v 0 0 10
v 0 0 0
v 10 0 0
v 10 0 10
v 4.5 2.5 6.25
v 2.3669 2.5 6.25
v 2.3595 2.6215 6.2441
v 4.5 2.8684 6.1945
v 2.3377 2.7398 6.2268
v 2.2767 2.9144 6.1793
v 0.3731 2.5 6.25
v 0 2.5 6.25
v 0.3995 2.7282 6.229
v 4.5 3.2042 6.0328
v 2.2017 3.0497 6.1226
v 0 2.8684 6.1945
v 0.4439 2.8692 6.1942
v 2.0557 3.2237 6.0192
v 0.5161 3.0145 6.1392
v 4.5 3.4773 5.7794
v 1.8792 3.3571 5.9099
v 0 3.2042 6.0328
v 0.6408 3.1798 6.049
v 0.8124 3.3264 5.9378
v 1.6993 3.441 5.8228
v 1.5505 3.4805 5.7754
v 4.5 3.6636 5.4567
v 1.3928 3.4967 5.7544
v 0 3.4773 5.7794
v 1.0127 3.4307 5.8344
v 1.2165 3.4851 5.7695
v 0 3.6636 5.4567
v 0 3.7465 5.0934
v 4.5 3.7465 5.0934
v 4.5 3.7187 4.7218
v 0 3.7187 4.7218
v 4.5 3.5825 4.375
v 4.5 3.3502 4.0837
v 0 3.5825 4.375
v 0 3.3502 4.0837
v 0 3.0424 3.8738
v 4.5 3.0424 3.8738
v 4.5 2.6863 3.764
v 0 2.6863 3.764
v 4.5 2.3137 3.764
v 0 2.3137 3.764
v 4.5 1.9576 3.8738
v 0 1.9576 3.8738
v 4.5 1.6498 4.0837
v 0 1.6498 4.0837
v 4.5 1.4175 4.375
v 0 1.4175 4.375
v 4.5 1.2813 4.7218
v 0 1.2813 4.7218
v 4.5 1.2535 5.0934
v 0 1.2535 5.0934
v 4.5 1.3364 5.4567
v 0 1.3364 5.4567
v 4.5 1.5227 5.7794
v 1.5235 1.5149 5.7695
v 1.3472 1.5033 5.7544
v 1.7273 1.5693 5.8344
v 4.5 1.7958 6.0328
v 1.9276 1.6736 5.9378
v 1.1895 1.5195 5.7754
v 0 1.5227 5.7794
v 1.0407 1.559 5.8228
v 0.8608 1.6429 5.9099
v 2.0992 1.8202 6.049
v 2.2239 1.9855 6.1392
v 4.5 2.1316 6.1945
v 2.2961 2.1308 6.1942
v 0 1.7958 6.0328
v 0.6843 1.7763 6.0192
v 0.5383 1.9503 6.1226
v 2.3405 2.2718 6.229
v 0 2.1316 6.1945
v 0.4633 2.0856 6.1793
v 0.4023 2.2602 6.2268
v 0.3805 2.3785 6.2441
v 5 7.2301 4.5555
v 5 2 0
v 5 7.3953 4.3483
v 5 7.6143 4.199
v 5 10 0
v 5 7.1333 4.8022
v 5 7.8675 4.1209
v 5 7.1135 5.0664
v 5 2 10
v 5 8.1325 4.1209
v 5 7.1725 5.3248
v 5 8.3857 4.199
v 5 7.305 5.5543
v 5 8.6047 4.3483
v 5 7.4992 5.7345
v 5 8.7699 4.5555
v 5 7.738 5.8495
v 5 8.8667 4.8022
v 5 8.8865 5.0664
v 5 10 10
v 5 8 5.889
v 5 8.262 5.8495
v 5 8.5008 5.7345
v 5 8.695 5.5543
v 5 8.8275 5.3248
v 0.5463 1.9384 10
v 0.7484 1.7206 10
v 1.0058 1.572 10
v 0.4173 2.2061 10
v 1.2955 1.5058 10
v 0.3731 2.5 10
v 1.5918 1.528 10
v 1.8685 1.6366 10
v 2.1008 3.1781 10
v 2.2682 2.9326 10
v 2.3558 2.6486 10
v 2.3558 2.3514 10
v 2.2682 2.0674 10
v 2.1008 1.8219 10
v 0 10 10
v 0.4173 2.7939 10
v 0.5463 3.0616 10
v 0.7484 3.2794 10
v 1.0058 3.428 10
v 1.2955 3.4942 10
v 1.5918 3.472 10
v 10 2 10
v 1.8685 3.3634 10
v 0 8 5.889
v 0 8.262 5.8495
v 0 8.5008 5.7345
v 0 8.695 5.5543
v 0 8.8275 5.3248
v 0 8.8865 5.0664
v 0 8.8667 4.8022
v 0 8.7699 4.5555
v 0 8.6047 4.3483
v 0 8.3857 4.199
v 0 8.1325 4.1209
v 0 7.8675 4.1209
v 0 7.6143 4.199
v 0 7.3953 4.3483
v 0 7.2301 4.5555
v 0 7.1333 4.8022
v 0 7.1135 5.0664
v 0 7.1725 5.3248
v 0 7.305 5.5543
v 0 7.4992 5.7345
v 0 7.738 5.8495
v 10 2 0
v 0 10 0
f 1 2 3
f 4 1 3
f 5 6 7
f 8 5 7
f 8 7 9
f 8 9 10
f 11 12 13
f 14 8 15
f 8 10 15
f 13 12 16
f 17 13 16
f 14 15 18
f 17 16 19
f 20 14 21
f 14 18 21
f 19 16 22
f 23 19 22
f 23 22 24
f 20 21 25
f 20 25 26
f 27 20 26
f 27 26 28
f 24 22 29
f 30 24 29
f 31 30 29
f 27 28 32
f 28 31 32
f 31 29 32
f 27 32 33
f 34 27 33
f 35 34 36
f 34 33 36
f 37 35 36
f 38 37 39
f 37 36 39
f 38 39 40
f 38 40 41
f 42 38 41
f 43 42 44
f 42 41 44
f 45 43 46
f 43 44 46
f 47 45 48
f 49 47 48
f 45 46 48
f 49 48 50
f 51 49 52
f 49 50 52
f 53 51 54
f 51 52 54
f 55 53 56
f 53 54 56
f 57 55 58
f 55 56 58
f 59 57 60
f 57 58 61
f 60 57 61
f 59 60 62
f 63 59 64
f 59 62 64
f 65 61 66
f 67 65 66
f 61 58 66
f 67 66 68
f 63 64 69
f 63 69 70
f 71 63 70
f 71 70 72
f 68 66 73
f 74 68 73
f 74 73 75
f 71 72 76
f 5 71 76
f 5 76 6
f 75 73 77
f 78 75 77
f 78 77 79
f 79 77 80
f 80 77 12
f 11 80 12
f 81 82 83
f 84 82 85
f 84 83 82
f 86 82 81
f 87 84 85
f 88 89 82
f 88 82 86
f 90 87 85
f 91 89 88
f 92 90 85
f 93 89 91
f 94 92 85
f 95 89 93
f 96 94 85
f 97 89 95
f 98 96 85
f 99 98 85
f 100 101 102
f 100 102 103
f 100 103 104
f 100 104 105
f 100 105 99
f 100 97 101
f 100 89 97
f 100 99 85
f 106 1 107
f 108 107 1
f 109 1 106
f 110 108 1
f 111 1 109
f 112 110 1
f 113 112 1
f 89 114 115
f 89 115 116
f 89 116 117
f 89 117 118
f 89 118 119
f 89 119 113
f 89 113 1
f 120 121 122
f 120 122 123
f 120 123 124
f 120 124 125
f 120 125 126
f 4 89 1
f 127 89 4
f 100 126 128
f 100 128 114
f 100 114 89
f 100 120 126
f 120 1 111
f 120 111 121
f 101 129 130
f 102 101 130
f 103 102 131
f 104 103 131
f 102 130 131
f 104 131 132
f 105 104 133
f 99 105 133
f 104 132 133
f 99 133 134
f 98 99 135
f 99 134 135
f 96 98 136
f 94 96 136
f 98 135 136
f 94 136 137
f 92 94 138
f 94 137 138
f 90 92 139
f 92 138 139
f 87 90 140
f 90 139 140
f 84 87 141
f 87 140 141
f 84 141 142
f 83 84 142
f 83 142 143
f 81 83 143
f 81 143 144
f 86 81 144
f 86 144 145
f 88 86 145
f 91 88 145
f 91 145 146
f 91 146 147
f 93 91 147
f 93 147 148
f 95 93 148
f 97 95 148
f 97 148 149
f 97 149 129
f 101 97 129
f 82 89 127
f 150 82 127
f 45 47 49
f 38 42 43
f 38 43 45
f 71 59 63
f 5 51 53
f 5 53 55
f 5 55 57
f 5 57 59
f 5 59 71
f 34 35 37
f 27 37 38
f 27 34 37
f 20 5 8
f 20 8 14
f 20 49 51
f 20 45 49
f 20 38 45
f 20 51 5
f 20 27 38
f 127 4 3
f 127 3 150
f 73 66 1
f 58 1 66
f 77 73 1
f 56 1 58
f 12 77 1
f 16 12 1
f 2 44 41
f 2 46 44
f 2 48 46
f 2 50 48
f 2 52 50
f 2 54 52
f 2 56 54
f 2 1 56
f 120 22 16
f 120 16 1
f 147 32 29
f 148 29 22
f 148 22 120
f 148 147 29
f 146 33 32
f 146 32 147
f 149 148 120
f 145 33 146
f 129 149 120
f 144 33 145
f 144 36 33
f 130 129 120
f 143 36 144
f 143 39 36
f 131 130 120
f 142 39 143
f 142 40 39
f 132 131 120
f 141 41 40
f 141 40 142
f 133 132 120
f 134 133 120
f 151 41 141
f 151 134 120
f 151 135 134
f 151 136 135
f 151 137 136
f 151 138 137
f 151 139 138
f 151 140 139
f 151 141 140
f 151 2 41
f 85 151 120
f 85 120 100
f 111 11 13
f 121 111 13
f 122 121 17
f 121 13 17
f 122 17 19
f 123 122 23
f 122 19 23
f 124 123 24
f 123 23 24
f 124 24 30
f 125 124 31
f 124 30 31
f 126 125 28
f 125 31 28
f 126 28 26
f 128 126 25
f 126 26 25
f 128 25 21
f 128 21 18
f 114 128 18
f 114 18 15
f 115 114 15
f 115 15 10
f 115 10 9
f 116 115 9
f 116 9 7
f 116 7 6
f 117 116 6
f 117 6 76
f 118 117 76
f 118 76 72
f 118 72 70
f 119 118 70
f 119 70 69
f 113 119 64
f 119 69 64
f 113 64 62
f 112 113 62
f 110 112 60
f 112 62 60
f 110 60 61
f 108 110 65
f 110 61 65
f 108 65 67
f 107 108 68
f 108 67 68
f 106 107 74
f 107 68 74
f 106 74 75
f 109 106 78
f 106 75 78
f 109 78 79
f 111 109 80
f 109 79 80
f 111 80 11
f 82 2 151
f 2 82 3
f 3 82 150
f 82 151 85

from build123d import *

# Parameters (mm, degrees)
SKETCH1_W                 = 10
SKETCH1_H                 = 10
EXTRUDE1_DEPTH            = 10
SKETCH2_W                 = 5
SKETCH2_H                 = 8
EXTRUDE2_DEPTH            = 11
SKETCH4_R                 = 1.25
CUT_EXTRUDE1_DEPTH        = 4.5
F_3_48_TAPPED_HOLE1_D     = 1.9939
F_3_48_TAPPED_HOLE1_DEPTH = 5
F_3_48_TAPPED_HOLE1_TIP   = 0.599027994
F_2_56_TAPPED_HOLE1_D     = 1.778
F_2_56_TAPPED_HOLE1_DEPTH = 5.73
F_2_56_TAPPED_HOLE1_TIP   = 0.53416509


with BuildPart() as part:
    # Sketch1 → Extrude1 (new body)
    with BuildSketch(Plane.XY):
        with Locations((5, 5)):
            Rectangle(SKETCH1_W, SKETCH1_H)
    extrude(amount=EXTRUDE1_DEPTH)

    # Sketch2 → Extrude2 (cut, through all)
    with BuildSketch(Plane.XY.offset(10)):
        with Locations((7.5, 6)):
            Rectangle(SKETCH2_W, SKETCH2_H)
    extrude(amount=-EXTRUDE2_DEPTH, mode=Mode.SUBTRACT)

    # Sketch4 → Cut-Extrude1 (cut)
    with BuildSketch(Plane.ZY):
        with Locations((5, 2.5)):
            Circle(SKETCH4_R)
    extrude(amount=-CUT_EXTRUDE1_DEPTH, mode=Mode.SUBTRACT)

    # #3-48 Tapped Hole1
    with Locations(Plane.XY.offset(10)):
        with Locations((1.37, 2.5)):
            Hole(F_3_48_TAPPED_HOLE1_D / 2, depth=F_3_48_TAPPED_HOLE1_DEPTH)
            with Locations((0, 0, -(F_3_48_TAPPED_HOLE1_DEPTH + F_3_48_TAPPED_HOLE1_TIP / 2))):  # 118° drill point
                Cone(0, F_3_48_TAPPED_HOLE1_D / 2, F_3_48_TAPPED_HOLE1_TIP, mode=Mode.SUBTRACT)

    # #2-56 Tapped Hole1
    with Locations(Plane(origin=(5, 0, 0), x_dir=(0, 0, -1), z_dir=(1, 0, 0))):
        with Locations((-5, 8)):
            Hole(F_2_56_TAPPED_HOLE1_D / 2, depth=F_2_56_TAPPED_HOLE1_DEPTH)
            with Locations((0, 0, -(F_2_56_TAPPED_HOLE1_DEPTH + F_2_56_TAPPED_HOLE1_TIP / 2))):  # 118° drill point
                Cone(0, F_2_56_TAPPED_HOLE1_D / 2, F_2_56_TAPPED_HOLE1_TIP, mode=Mode.SUBTRACT)


solid = part.part
